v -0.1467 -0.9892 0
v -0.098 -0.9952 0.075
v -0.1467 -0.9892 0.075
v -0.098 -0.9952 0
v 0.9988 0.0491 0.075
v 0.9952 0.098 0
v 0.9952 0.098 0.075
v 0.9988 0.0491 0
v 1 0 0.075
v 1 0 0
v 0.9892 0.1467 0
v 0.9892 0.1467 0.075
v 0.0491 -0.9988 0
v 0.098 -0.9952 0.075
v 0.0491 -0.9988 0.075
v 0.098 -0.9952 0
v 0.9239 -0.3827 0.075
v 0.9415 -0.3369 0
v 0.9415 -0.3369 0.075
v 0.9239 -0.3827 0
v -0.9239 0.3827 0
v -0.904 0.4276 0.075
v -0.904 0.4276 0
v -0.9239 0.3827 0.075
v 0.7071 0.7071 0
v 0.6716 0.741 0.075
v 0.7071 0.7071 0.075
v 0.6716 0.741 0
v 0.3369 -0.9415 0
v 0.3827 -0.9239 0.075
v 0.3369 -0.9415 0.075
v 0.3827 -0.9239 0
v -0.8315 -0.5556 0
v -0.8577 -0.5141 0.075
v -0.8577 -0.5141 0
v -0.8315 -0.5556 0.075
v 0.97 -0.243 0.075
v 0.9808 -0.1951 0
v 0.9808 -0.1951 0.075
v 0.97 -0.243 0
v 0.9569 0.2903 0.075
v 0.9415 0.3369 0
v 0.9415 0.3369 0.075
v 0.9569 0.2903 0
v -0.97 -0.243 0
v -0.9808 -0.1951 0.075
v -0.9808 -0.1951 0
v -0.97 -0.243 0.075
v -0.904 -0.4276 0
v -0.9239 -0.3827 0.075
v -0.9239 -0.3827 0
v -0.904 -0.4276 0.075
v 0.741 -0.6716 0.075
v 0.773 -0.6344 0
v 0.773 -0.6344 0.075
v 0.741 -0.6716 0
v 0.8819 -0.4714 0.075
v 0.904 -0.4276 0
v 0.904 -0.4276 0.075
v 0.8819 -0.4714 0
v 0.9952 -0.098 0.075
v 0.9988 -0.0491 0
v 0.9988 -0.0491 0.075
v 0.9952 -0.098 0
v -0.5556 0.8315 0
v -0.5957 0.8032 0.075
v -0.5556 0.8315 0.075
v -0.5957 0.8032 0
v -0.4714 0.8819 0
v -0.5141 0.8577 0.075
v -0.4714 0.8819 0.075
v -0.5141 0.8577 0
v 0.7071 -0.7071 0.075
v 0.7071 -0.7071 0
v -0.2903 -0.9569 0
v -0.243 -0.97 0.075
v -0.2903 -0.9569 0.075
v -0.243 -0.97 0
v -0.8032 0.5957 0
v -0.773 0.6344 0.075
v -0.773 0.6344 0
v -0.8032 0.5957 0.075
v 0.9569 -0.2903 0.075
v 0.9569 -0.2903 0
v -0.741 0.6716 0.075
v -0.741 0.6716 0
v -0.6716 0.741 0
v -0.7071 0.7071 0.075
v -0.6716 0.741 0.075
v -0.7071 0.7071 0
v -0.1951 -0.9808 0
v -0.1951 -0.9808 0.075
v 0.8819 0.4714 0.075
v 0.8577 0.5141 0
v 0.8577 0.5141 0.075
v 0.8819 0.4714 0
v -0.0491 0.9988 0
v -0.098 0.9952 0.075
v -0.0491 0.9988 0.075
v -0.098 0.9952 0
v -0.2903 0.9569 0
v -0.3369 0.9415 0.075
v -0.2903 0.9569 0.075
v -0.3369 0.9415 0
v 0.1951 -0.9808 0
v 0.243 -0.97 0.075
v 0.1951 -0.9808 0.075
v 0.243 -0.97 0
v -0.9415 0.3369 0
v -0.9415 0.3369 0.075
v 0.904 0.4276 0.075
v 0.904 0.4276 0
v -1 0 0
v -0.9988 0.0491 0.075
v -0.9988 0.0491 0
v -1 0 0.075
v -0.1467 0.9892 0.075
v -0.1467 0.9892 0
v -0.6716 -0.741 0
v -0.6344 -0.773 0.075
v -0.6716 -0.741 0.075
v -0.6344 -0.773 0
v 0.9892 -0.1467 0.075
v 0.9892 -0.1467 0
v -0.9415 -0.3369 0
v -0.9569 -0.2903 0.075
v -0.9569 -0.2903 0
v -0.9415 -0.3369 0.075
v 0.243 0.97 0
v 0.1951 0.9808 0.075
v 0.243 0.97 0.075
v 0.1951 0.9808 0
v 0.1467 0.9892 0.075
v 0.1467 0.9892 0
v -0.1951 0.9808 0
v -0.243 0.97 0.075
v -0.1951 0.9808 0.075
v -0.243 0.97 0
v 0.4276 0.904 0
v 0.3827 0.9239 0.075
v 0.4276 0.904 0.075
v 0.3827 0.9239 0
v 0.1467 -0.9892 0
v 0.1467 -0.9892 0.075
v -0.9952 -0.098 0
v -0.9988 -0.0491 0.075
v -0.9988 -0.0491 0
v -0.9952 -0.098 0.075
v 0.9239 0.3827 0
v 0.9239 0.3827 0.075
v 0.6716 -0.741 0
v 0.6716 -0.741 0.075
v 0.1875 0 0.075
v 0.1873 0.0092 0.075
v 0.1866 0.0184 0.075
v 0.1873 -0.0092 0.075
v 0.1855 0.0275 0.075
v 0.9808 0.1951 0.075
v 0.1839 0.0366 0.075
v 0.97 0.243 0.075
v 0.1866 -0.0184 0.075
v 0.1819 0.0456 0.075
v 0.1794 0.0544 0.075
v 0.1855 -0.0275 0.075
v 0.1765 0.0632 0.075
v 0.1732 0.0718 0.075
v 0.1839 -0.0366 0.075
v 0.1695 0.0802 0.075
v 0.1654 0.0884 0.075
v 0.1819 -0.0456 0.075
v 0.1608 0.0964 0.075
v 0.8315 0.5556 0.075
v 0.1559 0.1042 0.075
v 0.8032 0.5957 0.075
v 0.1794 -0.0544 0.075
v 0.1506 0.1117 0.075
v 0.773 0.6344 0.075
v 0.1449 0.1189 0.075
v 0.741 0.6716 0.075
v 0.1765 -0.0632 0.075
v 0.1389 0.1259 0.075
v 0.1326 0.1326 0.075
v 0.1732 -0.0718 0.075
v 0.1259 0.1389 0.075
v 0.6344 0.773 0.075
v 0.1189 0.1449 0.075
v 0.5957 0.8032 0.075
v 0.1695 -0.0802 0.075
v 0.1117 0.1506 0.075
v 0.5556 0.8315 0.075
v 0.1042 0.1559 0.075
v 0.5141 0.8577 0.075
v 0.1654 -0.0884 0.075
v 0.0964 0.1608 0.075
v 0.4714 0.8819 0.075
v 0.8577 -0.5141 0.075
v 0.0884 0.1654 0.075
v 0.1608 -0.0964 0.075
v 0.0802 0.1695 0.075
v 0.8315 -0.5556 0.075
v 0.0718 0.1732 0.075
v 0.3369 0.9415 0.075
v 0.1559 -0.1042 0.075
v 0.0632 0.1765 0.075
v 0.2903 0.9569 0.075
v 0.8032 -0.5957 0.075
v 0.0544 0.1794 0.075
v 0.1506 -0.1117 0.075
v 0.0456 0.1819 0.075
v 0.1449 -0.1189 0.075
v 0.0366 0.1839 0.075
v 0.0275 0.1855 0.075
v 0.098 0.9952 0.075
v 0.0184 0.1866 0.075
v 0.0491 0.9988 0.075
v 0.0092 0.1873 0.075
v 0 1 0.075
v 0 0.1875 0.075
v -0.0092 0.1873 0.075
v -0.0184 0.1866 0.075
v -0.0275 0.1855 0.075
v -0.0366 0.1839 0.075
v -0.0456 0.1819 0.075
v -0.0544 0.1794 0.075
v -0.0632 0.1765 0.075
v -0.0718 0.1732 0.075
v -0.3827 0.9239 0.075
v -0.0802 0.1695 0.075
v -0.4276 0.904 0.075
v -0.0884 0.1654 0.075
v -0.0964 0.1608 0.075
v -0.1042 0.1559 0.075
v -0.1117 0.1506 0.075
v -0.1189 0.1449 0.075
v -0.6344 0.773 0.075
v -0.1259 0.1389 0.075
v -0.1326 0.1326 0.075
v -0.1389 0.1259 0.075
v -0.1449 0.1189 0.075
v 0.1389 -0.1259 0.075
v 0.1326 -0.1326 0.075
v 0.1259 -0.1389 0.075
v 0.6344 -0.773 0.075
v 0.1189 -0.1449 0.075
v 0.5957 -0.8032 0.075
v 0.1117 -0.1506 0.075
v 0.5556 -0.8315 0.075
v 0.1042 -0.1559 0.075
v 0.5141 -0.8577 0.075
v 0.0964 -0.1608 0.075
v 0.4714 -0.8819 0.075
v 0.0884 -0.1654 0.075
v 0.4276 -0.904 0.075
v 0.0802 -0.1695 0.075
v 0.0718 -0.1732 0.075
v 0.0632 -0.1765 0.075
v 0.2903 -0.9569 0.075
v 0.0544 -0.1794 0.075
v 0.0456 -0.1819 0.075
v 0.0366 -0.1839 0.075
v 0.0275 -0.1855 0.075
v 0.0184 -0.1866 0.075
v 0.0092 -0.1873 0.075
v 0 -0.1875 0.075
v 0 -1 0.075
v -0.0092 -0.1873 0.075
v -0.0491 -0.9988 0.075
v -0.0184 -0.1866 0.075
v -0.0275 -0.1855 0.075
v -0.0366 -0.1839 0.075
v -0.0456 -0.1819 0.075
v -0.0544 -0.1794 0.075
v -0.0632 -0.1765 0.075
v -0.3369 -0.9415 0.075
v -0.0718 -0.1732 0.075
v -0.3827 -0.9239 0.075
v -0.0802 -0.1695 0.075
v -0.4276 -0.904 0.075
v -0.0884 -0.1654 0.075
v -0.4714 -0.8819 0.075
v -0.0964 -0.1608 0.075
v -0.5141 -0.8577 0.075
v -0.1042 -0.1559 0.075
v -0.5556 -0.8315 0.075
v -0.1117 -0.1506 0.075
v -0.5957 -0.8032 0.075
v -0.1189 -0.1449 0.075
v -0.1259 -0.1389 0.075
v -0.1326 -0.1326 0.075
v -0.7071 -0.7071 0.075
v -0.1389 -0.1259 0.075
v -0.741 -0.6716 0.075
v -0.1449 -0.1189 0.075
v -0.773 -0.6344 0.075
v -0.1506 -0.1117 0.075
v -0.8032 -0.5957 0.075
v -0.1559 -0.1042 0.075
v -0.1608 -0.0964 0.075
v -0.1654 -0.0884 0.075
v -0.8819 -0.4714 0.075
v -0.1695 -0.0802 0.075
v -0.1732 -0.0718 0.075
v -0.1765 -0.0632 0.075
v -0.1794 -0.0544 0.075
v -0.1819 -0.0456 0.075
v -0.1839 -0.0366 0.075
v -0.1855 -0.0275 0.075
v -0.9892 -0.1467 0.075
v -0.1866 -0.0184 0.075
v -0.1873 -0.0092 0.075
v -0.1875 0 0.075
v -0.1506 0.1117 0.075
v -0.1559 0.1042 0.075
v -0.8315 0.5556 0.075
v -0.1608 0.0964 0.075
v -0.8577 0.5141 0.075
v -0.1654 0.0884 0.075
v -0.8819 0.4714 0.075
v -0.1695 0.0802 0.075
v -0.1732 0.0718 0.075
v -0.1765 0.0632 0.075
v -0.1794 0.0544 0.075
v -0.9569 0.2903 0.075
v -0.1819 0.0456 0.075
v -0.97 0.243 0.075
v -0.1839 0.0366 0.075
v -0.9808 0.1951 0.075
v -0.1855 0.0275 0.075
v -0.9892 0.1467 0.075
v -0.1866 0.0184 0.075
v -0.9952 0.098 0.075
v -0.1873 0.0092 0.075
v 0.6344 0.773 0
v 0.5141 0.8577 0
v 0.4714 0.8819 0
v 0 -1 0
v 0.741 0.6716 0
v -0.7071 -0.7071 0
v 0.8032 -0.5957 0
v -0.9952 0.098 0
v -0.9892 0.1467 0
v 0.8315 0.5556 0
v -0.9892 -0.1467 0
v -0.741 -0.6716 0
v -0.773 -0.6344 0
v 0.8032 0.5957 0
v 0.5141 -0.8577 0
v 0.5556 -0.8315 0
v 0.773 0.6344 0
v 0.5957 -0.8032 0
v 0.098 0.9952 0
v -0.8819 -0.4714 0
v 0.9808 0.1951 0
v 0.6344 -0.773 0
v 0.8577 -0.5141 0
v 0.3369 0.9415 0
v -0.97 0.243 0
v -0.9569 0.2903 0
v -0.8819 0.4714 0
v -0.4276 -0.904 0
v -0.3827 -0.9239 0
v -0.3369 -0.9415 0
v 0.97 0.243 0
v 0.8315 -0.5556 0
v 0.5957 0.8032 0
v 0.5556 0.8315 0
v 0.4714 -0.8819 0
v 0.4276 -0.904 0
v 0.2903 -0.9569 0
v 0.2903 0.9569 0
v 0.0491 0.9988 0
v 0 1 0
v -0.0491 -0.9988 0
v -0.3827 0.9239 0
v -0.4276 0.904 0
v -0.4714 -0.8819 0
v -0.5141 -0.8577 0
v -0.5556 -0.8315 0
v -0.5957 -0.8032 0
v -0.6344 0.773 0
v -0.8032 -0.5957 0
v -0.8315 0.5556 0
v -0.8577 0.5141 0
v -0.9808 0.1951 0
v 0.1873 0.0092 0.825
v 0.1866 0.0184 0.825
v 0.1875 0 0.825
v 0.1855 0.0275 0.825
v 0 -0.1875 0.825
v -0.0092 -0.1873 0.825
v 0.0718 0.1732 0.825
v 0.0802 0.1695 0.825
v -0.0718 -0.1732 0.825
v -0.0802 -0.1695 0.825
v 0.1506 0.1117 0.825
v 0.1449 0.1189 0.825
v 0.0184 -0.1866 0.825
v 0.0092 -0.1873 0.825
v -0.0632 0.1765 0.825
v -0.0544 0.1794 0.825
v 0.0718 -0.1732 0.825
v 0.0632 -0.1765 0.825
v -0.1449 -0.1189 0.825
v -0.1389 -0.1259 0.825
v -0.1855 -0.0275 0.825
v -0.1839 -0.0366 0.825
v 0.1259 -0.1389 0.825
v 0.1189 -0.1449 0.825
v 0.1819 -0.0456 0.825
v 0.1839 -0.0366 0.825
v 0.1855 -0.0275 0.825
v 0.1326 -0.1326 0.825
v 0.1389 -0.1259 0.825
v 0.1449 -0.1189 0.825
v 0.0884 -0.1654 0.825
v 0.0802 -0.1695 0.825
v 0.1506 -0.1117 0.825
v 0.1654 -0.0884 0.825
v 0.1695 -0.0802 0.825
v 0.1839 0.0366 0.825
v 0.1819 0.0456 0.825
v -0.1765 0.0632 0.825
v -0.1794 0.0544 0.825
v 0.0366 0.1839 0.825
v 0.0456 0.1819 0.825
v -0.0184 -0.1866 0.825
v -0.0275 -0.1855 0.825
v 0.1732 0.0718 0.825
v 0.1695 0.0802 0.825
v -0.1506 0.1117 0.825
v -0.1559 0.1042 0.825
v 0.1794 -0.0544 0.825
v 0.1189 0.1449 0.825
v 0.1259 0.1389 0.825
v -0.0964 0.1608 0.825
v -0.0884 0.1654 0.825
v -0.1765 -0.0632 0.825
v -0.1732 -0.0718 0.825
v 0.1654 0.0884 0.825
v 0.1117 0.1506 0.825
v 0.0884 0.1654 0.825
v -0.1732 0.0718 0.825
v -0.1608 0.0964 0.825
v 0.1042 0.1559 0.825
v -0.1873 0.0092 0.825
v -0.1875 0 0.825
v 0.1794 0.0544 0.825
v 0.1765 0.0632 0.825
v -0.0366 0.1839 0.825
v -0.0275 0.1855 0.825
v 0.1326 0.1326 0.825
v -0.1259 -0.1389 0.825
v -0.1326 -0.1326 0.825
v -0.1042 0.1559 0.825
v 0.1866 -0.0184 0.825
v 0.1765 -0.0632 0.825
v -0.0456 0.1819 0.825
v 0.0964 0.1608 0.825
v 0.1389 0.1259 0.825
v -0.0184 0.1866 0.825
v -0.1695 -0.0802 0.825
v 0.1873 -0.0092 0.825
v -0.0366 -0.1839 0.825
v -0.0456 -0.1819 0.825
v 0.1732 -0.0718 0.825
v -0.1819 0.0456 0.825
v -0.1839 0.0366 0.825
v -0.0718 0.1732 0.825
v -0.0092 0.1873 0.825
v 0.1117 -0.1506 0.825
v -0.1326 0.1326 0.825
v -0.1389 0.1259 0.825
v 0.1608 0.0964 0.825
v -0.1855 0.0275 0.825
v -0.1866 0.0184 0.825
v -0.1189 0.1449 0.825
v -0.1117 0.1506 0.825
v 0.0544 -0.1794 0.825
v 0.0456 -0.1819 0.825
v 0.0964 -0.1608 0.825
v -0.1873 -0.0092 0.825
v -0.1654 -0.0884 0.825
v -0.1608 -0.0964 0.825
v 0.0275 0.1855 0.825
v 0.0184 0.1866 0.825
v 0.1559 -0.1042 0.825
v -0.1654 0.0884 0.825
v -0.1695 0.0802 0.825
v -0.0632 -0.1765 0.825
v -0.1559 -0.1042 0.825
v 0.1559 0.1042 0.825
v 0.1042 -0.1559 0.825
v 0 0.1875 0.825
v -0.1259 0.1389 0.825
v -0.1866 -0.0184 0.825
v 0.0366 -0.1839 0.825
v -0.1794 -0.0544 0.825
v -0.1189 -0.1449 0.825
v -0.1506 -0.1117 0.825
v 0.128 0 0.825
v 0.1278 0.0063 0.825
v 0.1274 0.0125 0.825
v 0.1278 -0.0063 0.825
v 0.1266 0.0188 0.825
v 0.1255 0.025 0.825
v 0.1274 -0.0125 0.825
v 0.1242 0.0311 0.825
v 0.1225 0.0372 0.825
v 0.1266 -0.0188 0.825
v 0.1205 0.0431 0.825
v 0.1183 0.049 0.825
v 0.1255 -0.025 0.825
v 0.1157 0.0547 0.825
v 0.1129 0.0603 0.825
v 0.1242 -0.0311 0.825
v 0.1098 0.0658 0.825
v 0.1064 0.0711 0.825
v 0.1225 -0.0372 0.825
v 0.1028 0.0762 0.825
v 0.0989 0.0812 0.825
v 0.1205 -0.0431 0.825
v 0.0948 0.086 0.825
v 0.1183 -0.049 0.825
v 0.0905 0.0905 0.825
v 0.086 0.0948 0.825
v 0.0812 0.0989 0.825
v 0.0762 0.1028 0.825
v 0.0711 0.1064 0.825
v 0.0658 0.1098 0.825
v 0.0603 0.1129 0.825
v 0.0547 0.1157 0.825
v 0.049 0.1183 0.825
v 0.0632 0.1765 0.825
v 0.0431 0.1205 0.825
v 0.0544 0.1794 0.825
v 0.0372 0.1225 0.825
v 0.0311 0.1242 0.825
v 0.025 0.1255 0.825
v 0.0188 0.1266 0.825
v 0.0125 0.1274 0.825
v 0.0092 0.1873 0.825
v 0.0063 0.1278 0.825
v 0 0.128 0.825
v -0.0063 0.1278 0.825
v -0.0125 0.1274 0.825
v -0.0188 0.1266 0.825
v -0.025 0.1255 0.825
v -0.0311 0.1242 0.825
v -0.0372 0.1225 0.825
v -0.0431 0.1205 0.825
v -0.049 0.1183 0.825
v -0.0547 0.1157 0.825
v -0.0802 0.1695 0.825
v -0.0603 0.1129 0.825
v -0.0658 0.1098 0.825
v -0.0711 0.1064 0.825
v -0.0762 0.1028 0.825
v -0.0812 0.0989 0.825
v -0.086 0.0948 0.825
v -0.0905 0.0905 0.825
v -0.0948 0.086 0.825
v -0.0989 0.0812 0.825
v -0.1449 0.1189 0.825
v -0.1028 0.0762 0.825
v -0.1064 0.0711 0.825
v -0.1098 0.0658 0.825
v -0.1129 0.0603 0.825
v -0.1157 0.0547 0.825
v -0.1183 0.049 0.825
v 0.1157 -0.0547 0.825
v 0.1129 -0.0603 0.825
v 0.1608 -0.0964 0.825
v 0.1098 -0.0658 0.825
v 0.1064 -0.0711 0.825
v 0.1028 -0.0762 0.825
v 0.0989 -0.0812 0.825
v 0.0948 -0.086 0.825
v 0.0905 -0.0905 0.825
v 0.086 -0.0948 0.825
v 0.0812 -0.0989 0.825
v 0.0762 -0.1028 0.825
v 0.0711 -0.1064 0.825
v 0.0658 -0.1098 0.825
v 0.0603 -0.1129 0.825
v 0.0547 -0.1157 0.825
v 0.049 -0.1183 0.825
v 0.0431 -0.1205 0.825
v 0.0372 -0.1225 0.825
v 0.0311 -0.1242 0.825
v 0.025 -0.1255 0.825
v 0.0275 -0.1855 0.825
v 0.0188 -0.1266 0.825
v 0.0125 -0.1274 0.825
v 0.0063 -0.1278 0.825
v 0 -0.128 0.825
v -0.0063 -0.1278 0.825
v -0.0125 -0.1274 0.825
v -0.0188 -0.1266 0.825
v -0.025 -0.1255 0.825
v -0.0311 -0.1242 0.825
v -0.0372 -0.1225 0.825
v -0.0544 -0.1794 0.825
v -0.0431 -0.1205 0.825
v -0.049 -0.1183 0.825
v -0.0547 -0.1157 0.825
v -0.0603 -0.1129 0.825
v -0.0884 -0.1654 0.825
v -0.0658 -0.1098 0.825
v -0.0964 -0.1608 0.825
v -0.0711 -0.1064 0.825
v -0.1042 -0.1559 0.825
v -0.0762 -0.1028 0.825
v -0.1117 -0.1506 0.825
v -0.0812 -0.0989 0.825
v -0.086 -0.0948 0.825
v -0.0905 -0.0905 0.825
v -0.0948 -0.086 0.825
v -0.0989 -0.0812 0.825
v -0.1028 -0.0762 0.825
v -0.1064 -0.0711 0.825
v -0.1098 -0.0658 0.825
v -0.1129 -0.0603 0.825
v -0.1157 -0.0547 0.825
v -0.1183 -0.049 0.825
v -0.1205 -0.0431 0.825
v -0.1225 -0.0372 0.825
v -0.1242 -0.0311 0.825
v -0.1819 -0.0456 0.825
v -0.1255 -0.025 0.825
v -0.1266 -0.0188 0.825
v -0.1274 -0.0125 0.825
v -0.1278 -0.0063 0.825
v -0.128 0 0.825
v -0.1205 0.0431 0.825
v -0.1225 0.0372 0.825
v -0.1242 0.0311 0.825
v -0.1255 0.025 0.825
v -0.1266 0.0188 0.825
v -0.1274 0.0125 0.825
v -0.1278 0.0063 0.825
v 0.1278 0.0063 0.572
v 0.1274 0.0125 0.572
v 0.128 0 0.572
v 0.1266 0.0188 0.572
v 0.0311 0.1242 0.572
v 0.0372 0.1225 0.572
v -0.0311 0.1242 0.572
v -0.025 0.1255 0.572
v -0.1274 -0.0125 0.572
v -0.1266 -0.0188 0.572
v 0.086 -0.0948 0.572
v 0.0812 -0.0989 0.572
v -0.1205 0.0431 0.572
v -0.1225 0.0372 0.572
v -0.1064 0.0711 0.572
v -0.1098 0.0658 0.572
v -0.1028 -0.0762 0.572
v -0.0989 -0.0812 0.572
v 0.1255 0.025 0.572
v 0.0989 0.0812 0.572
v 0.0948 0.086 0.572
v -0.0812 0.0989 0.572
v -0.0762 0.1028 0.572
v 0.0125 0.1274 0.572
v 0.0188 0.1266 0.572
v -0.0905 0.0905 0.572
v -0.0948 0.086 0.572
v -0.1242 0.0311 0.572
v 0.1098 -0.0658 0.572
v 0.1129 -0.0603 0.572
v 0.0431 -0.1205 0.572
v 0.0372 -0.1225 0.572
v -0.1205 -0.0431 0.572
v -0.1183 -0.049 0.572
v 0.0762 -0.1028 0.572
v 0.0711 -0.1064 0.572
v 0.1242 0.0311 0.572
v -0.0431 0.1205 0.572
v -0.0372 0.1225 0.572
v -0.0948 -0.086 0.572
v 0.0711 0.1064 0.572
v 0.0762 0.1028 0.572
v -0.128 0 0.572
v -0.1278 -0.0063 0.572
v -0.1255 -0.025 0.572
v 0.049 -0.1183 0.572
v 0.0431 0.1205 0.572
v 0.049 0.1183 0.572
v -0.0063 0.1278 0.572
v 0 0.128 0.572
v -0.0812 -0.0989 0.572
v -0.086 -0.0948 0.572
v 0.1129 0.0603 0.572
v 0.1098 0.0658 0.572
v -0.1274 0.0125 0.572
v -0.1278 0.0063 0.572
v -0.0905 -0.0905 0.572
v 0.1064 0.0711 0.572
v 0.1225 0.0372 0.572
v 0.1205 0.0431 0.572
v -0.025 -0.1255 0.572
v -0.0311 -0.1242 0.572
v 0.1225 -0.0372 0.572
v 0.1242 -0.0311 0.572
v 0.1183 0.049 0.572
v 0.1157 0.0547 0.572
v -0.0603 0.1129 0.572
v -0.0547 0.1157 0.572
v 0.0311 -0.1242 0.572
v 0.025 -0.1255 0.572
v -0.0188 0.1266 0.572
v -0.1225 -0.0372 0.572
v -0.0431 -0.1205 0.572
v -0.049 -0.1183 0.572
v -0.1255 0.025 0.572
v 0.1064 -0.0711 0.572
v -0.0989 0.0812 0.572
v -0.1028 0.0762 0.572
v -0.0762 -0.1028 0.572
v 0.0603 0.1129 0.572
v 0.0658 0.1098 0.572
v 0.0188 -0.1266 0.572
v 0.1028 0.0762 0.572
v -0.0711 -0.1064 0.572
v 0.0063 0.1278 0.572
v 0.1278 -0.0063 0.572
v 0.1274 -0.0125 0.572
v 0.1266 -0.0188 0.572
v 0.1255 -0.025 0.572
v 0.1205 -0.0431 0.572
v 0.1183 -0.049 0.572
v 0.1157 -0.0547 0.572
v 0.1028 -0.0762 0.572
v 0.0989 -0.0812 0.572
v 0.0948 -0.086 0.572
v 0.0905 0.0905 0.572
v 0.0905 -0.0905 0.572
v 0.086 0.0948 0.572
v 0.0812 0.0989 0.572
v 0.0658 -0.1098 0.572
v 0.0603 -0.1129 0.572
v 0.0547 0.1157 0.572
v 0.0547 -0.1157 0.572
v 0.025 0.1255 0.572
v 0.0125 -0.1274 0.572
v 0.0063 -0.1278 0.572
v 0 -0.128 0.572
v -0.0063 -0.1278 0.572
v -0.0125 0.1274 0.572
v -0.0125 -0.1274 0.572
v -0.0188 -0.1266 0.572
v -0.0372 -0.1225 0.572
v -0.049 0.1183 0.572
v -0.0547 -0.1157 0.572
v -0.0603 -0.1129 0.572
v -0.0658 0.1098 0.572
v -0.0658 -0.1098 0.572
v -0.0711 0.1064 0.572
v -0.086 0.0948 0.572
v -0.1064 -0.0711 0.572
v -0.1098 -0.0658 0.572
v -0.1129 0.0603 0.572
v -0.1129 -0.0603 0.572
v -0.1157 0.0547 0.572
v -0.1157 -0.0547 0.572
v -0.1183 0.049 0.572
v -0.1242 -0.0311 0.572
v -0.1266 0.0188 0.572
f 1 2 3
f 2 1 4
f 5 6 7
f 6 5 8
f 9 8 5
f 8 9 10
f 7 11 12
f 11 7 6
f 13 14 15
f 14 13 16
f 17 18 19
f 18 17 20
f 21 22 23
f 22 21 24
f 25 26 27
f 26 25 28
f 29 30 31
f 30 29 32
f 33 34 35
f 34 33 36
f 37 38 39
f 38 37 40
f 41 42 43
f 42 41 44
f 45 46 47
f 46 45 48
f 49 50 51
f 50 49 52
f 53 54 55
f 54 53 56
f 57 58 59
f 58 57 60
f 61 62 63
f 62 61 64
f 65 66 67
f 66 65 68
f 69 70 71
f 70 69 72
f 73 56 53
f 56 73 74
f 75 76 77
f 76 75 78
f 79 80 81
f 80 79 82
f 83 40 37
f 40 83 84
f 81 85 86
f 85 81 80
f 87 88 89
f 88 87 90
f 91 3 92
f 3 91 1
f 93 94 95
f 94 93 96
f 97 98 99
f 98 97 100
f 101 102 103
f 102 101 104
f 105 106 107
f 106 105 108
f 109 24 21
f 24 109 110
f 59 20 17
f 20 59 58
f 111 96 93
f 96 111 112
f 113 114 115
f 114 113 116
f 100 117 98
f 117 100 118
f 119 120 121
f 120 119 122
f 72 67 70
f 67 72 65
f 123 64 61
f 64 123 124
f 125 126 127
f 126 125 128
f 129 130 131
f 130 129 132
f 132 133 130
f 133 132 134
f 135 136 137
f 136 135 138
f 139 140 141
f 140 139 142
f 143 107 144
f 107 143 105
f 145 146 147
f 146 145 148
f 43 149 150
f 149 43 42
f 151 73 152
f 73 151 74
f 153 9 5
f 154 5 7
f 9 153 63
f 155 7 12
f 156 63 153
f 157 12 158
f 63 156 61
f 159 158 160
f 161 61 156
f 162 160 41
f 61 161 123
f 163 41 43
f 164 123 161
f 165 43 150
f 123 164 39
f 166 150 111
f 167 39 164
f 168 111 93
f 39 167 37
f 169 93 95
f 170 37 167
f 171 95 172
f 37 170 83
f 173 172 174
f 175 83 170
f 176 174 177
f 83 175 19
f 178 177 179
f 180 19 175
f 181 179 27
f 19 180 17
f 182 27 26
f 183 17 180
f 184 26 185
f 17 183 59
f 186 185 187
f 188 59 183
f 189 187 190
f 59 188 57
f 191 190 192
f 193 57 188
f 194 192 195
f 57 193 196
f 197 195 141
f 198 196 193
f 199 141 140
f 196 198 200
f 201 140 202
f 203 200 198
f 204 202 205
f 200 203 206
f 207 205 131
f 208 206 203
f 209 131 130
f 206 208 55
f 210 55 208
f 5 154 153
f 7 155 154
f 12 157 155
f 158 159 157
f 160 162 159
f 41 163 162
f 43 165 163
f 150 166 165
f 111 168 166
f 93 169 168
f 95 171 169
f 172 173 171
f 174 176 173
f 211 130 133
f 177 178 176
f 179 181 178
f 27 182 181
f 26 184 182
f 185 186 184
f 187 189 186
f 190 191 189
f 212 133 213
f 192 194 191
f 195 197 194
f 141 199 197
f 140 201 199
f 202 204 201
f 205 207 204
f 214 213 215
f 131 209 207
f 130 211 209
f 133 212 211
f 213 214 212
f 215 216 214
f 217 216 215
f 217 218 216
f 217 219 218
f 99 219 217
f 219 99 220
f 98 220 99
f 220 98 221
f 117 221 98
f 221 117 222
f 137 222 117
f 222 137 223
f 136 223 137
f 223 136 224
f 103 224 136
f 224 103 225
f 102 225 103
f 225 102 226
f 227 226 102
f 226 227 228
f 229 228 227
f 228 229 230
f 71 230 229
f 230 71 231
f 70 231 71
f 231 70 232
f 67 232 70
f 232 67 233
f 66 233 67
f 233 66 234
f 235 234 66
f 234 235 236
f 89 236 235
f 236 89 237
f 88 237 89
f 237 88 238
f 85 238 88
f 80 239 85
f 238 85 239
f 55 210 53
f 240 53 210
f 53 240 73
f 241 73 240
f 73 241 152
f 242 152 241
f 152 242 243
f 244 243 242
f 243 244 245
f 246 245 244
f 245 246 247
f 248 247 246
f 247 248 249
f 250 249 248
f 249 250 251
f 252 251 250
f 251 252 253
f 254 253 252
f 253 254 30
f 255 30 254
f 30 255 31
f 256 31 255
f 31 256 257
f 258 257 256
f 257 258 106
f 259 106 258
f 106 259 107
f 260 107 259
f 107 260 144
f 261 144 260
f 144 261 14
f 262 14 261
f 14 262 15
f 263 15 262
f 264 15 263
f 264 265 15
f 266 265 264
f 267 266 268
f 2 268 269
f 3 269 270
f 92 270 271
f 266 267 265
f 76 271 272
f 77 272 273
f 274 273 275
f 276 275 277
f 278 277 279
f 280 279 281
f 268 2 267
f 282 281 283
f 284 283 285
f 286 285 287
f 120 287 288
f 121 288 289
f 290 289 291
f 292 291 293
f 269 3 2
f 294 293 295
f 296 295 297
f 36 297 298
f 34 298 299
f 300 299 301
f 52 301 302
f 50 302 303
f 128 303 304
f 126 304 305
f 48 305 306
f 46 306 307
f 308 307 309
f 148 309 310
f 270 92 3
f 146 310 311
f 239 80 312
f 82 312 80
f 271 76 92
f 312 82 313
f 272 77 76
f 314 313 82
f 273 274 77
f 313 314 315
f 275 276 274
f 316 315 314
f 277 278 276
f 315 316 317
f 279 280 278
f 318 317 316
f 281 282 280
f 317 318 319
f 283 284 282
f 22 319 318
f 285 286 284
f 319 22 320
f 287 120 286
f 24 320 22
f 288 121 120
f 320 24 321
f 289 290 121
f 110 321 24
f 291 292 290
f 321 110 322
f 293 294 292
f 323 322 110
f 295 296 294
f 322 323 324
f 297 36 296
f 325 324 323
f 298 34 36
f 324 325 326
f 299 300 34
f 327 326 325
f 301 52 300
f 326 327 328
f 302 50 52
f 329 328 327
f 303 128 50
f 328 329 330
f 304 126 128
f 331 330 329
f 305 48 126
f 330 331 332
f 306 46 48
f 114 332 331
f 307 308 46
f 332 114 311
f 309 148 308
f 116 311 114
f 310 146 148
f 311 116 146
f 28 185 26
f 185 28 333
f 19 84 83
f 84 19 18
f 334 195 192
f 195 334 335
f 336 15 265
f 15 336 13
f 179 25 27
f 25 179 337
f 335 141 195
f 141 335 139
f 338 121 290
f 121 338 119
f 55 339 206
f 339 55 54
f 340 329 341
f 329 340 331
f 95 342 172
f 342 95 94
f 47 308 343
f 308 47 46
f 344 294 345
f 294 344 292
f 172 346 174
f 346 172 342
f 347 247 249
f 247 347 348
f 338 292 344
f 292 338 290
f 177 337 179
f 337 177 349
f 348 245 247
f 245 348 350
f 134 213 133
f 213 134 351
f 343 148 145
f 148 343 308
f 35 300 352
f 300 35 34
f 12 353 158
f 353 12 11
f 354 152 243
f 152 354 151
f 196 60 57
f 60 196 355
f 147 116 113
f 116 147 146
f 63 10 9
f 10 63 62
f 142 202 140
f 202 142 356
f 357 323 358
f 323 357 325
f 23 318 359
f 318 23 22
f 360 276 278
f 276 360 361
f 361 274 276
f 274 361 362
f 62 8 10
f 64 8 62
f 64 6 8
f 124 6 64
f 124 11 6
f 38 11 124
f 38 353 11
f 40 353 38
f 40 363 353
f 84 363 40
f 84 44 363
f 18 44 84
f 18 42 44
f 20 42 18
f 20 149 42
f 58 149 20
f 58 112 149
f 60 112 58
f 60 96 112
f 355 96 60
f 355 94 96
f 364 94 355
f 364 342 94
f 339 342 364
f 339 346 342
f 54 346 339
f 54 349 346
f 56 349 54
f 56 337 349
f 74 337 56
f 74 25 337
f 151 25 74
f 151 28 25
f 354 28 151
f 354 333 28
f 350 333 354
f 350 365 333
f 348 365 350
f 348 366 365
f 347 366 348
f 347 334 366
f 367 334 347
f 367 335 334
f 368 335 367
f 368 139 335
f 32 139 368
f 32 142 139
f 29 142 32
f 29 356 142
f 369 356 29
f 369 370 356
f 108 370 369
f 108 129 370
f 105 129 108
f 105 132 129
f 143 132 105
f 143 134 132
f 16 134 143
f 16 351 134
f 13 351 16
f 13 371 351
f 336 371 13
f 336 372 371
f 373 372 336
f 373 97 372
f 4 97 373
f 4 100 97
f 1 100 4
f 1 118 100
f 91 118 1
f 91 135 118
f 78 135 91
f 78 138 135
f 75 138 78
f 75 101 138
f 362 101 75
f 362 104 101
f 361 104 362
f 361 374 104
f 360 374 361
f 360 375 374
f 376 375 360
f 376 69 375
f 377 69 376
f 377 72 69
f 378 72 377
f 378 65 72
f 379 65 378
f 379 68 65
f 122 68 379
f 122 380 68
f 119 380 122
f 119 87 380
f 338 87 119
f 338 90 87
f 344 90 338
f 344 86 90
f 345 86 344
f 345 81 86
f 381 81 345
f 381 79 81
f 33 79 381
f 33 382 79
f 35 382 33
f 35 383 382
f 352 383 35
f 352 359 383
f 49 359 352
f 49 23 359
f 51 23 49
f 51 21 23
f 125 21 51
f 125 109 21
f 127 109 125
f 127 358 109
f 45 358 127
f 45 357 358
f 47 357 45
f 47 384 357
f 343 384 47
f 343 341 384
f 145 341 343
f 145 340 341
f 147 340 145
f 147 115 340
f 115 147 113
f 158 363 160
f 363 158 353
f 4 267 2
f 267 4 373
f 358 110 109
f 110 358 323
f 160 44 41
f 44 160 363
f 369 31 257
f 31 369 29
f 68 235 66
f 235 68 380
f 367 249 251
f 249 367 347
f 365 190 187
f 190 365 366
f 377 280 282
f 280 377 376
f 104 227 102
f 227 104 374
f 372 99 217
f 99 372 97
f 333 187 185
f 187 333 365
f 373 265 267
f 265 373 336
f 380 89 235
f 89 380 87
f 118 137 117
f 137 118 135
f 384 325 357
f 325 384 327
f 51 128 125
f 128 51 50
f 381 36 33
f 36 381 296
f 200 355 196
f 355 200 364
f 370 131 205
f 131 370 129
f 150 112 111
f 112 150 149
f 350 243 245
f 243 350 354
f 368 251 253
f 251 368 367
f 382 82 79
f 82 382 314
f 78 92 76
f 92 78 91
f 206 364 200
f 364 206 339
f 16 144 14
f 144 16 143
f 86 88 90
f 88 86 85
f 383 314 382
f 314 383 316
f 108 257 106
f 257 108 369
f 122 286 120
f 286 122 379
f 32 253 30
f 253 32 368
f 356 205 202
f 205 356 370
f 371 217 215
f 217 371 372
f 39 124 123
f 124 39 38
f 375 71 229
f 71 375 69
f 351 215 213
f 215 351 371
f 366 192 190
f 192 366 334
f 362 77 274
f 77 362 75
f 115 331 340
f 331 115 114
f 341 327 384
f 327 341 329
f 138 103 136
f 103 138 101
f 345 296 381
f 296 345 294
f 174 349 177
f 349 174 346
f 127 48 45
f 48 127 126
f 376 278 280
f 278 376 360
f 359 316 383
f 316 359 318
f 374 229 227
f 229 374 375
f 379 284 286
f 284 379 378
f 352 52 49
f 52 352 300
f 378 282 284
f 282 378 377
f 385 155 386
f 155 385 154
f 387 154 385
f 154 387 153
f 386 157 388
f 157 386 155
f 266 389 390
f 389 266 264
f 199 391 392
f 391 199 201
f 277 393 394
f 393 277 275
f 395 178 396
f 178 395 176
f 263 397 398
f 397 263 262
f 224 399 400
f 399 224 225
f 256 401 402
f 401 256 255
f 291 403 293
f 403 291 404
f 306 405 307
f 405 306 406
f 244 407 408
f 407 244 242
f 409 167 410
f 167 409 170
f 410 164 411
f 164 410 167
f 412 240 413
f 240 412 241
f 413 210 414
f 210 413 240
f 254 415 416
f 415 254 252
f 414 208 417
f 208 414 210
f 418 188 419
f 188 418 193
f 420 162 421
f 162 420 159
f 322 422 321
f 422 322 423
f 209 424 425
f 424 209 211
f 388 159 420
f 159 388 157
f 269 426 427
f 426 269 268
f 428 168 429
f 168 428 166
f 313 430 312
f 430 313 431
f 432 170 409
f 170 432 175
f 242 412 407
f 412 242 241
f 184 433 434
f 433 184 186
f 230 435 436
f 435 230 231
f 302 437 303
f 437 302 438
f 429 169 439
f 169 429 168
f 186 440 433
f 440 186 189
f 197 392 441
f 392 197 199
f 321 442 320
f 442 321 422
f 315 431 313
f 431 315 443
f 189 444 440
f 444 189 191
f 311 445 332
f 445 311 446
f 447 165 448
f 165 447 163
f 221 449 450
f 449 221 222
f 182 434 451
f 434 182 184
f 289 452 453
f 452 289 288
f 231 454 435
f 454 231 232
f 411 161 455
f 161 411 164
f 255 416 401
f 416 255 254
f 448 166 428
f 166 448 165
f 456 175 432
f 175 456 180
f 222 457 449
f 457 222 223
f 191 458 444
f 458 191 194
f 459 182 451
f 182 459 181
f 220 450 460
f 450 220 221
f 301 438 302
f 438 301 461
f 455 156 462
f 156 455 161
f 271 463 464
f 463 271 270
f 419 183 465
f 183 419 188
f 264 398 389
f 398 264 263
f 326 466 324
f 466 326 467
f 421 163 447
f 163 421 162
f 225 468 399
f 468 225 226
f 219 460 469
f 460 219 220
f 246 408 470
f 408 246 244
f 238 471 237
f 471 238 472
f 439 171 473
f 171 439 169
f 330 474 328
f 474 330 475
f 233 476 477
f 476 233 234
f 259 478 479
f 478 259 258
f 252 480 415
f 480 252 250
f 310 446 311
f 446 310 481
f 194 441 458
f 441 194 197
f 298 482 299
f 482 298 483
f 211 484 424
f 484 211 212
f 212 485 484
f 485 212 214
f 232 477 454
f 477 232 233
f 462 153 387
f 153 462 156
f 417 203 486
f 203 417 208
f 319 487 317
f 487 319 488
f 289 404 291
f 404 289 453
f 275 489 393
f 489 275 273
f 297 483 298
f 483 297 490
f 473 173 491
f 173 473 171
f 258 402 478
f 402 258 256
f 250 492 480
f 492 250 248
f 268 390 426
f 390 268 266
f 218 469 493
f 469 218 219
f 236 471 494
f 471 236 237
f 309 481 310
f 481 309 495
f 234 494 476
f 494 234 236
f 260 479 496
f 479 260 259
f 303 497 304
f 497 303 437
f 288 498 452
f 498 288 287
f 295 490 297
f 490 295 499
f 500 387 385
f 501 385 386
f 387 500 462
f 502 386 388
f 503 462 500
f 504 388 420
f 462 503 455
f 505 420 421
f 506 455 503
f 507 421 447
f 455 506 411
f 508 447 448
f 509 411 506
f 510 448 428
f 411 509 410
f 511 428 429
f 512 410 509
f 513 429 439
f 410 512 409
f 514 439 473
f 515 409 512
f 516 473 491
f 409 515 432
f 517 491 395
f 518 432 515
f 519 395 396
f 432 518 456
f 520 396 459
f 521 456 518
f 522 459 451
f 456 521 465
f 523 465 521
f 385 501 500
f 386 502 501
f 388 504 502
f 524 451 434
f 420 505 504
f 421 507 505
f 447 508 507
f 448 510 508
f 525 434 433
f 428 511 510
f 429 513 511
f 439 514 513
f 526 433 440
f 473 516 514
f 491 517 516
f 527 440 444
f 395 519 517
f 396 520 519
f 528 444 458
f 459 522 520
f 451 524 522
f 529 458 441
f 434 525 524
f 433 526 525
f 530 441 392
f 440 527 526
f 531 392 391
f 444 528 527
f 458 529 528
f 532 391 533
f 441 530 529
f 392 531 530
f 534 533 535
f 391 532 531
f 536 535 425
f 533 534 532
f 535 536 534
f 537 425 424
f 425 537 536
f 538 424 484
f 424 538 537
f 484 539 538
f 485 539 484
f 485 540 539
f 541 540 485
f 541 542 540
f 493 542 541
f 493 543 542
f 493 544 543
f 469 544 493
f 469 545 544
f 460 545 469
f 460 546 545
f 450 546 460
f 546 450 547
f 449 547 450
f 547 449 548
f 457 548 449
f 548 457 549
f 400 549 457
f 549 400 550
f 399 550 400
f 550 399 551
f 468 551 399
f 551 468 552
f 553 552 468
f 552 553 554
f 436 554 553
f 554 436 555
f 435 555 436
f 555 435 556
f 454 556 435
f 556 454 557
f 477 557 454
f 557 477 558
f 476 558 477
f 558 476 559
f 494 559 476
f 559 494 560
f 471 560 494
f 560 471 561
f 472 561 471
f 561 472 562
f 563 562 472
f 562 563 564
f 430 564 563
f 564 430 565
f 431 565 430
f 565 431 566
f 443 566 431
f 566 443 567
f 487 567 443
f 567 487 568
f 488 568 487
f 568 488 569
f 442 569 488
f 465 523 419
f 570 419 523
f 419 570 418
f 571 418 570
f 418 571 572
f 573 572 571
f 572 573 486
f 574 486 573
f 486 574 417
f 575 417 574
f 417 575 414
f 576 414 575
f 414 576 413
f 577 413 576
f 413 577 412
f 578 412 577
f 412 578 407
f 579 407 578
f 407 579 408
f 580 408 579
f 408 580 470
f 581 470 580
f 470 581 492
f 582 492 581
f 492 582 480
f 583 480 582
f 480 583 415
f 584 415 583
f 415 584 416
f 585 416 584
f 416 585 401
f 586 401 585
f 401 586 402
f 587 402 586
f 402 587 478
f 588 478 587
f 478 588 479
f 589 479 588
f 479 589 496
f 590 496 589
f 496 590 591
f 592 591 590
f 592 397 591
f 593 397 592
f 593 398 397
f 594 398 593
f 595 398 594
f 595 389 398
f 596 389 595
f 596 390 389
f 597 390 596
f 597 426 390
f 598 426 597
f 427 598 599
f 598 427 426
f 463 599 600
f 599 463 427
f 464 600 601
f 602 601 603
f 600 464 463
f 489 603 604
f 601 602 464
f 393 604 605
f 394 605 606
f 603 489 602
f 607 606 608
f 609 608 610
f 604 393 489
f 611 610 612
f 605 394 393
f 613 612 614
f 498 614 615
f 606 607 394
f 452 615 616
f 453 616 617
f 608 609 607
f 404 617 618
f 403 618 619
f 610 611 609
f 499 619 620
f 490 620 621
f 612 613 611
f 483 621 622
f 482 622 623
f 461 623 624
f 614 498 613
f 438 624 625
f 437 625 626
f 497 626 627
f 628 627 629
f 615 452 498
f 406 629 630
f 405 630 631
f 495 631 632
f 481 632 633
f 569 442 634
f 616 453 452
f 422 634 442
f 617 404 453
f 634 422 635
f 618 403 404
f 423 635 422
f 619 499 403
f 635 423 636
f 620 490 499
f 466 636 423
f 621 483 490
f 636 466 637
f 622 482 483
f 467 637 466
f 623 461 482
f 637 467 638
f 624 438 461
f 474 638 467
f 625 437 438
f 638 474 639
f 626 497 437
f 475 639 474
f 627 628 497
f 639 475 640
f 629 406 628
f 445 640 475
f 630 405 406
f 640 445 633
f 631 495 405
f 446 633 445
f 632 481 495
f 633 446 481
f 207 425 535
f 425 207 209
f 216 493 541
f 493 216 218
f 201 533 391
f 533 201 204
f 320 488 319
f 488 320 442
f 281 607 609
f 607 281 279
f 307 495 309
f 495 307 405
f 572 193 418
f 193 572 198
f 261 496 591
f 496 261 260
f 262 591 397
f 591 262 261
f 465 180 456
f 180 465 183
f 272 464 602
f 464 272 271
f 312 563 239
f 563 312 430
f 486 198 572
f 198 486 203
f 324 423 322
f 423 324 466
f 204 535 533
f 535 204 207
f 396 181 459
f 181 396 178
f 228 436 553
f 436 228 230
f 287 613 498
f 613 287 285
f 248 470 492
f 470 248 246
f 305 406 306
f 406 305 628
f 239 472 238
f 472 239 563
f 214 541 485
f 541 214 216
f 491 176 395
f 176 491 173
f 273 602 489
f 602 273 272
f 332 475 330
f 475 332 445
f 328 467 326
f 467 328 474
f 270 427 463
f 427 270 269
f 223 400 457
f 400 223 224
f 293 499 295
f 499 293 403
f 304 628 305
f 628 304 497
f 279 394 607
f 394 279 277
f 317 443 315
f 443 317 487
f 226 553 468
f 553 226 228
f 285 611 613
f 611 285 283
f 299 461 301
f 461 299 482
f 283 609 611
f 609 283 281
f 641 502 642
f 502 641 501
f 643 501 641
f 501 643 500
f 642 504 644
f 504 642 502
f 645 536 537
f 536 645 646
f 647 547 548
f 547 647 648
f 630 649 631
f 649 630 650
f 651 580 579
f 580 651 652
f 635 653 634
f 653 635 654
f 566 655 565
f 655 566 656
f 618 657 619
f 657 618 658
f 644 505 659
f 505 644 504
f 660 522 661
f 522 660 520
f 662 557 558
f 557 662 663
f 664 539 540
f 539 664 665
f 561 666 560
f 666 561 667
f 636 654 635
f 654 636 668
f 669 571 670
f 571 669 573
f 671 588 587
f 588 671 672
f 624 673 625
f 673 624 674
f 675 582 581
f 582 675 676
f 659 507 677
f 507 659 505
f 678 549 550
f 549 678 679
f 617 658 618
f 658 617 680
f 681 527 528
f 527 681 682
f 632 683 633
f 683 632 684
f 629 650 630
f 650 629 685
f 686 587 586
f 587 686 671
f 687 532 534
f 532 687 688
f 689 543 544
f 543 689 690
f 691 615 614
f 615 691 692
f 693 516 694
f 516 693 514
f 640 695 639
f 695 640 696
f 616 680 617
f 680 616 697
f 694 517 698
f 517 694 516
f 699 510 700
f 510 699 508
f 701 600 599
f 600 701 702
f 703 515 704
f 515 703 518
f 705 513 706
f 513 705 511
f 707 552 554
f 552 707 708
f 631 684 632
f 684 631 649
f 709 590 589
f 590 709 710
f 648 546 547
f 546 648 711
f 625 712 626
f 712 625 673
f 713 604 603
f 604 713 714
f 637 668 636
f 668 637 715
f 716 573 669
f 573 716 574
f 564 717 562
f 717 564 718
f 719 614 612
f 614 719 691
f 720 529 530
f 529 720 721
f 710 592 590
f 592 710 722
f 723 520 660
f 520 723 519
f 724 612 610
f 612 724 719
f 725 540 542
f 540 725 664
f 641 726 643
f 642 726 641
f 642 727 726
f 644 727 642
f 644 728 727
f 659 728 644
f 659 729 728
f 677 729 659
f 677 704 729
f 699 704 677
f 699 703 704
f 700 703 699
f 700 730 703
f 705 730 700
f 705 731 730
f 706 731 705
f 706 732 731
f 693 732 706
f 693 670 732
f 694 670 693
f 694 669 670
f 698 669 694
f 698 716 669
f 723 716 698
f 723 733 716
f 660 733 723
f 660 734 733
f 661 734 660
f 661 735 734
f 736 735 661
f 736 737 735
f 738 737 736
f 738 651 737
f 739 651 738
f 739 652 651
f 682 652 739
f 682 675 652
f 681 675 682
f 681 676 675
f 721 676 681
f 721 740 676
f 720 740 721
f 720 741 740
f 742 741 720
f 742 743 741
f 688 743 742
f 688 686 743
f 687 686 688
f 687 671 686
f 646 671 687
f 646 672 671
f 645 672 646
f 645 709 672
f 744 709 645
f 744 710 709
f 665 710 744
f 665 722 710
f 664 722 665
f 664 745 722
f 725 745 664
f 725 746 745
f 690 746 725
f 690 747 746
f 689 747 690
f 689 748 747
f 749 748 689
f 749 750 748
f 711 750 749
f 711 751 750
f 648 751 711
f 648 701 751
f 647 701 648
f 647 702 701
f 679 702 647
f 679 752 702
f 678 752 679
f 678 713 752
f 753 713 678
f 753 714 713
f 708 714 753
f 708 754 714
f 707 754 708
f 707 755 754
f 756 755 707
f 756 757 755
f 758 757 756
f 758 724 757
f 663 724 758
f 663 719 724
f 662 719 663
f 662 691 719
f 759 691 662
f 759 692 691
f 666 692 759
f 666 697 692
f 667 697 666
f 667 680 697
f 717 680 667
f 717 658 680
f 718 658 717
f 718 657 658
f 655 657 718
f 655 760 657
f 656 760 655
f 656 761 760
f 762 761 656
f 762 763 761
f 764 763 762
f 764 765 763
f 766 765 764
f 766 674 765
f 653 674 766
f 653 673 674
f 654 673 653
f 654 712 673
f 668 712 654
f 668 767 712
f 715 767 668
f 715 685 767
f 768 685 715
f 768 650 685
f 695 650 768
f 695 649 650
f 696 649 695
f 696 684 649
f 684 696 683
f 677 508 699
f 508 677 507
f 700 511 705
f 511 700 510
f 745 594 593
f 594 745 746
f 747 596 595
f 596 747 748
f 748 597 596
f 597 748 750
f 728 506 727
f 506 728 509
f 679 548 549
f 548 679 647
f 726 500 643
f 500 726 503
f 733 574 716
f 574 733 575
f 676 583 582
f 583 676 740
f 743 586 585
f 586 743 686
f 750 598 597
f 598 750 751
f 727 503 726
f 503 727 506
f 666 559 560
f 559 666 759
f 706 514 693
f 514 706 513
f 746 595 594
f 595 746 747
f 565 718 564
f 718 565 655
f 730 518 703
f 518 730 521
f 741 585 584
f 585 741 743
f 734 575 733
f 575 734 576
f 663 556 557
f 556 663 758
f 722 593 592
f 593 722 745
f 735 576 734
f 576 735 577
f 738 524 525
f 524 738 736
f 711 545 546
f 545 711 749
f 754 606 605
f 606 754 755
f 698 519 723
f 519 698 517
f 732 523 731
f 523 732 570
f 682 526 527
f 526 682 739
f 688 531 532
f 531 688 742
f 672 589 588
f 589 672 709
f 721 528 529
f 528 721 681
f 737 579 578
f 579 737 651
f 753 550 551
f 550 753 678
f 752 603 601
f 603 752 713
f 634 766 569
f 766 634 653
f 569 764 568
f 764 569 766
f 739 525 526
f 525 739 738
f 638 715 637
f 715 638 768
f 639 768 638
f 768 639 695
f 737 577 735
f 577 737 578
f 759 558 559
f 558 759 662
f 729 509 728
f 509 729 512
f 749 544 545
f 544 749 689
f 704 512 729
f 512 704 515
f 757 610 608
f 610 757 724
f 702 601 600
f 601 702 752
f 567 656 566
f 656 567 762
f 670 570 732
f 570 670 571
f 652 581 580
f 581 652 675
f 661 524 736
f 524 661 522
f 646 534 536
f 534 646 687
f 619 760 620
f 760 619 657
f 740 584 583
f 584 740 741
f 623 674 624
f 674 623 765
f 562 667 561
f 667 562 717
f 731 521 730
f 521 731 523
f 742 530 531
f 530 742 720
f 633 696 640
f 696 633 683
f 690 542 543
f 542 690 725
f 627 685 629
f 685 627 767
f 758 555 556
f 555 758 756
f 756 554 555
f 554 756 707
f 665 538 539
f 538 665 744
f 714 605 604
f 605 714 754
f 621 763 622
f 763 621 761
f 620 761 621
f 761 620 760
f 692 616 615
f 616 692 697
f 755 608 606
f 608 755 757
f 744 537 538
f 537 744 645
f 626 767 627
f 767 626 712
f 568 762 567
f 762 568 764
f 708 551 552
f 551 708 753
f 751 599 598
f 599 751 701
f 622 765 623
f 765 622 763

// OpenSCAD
// file: common.scad
flange_dia = 2;
shaft_dia = 0.375;
tenon_dia = shaft_dia - 0.125;

flange_thickness = 0.075;
shaft_length = 1.5;
tenon_length = 0.25;

mortoise_slop = 0.003;

followthrough = 0.01;

module spool_half(flange_dia, shaft_dia, flange_thickness, shaft_length)
{
	union()
	{
		cylinder(d = flange_dia, h = flange_thickness);
		cylinder(d = shaft_dia, h = flange_thickness + shaft_length);
	}
}
// main file
include <common.scad>

$fn = 128;

module spool_bottom(
	flange_dia = flange_dia,
	shaft_dia = shaft_dia,
	flange_thickness = flange_thickness,
	shaft_length = shaft_length / 2,
	tenon_dia = tenon_dia,
	tenon_length = tenon_length,
	mortoise_slop = mortoise_slop,
	followthrough = followthrough
)
{
	difference()
	{
		spool_half(flange_dia, shaft_dia, flange_thickness, shaft_length);
		translate([0, 0, flange_thickness + shaft_length - tenon_length - mortoise_slop])
		{
			cylinder(d = tenon_dia + 2 * mortoise_slop, h = tenon_length + mortoise_slop + followthrough);
		}
	}
}

spool_bottom();
